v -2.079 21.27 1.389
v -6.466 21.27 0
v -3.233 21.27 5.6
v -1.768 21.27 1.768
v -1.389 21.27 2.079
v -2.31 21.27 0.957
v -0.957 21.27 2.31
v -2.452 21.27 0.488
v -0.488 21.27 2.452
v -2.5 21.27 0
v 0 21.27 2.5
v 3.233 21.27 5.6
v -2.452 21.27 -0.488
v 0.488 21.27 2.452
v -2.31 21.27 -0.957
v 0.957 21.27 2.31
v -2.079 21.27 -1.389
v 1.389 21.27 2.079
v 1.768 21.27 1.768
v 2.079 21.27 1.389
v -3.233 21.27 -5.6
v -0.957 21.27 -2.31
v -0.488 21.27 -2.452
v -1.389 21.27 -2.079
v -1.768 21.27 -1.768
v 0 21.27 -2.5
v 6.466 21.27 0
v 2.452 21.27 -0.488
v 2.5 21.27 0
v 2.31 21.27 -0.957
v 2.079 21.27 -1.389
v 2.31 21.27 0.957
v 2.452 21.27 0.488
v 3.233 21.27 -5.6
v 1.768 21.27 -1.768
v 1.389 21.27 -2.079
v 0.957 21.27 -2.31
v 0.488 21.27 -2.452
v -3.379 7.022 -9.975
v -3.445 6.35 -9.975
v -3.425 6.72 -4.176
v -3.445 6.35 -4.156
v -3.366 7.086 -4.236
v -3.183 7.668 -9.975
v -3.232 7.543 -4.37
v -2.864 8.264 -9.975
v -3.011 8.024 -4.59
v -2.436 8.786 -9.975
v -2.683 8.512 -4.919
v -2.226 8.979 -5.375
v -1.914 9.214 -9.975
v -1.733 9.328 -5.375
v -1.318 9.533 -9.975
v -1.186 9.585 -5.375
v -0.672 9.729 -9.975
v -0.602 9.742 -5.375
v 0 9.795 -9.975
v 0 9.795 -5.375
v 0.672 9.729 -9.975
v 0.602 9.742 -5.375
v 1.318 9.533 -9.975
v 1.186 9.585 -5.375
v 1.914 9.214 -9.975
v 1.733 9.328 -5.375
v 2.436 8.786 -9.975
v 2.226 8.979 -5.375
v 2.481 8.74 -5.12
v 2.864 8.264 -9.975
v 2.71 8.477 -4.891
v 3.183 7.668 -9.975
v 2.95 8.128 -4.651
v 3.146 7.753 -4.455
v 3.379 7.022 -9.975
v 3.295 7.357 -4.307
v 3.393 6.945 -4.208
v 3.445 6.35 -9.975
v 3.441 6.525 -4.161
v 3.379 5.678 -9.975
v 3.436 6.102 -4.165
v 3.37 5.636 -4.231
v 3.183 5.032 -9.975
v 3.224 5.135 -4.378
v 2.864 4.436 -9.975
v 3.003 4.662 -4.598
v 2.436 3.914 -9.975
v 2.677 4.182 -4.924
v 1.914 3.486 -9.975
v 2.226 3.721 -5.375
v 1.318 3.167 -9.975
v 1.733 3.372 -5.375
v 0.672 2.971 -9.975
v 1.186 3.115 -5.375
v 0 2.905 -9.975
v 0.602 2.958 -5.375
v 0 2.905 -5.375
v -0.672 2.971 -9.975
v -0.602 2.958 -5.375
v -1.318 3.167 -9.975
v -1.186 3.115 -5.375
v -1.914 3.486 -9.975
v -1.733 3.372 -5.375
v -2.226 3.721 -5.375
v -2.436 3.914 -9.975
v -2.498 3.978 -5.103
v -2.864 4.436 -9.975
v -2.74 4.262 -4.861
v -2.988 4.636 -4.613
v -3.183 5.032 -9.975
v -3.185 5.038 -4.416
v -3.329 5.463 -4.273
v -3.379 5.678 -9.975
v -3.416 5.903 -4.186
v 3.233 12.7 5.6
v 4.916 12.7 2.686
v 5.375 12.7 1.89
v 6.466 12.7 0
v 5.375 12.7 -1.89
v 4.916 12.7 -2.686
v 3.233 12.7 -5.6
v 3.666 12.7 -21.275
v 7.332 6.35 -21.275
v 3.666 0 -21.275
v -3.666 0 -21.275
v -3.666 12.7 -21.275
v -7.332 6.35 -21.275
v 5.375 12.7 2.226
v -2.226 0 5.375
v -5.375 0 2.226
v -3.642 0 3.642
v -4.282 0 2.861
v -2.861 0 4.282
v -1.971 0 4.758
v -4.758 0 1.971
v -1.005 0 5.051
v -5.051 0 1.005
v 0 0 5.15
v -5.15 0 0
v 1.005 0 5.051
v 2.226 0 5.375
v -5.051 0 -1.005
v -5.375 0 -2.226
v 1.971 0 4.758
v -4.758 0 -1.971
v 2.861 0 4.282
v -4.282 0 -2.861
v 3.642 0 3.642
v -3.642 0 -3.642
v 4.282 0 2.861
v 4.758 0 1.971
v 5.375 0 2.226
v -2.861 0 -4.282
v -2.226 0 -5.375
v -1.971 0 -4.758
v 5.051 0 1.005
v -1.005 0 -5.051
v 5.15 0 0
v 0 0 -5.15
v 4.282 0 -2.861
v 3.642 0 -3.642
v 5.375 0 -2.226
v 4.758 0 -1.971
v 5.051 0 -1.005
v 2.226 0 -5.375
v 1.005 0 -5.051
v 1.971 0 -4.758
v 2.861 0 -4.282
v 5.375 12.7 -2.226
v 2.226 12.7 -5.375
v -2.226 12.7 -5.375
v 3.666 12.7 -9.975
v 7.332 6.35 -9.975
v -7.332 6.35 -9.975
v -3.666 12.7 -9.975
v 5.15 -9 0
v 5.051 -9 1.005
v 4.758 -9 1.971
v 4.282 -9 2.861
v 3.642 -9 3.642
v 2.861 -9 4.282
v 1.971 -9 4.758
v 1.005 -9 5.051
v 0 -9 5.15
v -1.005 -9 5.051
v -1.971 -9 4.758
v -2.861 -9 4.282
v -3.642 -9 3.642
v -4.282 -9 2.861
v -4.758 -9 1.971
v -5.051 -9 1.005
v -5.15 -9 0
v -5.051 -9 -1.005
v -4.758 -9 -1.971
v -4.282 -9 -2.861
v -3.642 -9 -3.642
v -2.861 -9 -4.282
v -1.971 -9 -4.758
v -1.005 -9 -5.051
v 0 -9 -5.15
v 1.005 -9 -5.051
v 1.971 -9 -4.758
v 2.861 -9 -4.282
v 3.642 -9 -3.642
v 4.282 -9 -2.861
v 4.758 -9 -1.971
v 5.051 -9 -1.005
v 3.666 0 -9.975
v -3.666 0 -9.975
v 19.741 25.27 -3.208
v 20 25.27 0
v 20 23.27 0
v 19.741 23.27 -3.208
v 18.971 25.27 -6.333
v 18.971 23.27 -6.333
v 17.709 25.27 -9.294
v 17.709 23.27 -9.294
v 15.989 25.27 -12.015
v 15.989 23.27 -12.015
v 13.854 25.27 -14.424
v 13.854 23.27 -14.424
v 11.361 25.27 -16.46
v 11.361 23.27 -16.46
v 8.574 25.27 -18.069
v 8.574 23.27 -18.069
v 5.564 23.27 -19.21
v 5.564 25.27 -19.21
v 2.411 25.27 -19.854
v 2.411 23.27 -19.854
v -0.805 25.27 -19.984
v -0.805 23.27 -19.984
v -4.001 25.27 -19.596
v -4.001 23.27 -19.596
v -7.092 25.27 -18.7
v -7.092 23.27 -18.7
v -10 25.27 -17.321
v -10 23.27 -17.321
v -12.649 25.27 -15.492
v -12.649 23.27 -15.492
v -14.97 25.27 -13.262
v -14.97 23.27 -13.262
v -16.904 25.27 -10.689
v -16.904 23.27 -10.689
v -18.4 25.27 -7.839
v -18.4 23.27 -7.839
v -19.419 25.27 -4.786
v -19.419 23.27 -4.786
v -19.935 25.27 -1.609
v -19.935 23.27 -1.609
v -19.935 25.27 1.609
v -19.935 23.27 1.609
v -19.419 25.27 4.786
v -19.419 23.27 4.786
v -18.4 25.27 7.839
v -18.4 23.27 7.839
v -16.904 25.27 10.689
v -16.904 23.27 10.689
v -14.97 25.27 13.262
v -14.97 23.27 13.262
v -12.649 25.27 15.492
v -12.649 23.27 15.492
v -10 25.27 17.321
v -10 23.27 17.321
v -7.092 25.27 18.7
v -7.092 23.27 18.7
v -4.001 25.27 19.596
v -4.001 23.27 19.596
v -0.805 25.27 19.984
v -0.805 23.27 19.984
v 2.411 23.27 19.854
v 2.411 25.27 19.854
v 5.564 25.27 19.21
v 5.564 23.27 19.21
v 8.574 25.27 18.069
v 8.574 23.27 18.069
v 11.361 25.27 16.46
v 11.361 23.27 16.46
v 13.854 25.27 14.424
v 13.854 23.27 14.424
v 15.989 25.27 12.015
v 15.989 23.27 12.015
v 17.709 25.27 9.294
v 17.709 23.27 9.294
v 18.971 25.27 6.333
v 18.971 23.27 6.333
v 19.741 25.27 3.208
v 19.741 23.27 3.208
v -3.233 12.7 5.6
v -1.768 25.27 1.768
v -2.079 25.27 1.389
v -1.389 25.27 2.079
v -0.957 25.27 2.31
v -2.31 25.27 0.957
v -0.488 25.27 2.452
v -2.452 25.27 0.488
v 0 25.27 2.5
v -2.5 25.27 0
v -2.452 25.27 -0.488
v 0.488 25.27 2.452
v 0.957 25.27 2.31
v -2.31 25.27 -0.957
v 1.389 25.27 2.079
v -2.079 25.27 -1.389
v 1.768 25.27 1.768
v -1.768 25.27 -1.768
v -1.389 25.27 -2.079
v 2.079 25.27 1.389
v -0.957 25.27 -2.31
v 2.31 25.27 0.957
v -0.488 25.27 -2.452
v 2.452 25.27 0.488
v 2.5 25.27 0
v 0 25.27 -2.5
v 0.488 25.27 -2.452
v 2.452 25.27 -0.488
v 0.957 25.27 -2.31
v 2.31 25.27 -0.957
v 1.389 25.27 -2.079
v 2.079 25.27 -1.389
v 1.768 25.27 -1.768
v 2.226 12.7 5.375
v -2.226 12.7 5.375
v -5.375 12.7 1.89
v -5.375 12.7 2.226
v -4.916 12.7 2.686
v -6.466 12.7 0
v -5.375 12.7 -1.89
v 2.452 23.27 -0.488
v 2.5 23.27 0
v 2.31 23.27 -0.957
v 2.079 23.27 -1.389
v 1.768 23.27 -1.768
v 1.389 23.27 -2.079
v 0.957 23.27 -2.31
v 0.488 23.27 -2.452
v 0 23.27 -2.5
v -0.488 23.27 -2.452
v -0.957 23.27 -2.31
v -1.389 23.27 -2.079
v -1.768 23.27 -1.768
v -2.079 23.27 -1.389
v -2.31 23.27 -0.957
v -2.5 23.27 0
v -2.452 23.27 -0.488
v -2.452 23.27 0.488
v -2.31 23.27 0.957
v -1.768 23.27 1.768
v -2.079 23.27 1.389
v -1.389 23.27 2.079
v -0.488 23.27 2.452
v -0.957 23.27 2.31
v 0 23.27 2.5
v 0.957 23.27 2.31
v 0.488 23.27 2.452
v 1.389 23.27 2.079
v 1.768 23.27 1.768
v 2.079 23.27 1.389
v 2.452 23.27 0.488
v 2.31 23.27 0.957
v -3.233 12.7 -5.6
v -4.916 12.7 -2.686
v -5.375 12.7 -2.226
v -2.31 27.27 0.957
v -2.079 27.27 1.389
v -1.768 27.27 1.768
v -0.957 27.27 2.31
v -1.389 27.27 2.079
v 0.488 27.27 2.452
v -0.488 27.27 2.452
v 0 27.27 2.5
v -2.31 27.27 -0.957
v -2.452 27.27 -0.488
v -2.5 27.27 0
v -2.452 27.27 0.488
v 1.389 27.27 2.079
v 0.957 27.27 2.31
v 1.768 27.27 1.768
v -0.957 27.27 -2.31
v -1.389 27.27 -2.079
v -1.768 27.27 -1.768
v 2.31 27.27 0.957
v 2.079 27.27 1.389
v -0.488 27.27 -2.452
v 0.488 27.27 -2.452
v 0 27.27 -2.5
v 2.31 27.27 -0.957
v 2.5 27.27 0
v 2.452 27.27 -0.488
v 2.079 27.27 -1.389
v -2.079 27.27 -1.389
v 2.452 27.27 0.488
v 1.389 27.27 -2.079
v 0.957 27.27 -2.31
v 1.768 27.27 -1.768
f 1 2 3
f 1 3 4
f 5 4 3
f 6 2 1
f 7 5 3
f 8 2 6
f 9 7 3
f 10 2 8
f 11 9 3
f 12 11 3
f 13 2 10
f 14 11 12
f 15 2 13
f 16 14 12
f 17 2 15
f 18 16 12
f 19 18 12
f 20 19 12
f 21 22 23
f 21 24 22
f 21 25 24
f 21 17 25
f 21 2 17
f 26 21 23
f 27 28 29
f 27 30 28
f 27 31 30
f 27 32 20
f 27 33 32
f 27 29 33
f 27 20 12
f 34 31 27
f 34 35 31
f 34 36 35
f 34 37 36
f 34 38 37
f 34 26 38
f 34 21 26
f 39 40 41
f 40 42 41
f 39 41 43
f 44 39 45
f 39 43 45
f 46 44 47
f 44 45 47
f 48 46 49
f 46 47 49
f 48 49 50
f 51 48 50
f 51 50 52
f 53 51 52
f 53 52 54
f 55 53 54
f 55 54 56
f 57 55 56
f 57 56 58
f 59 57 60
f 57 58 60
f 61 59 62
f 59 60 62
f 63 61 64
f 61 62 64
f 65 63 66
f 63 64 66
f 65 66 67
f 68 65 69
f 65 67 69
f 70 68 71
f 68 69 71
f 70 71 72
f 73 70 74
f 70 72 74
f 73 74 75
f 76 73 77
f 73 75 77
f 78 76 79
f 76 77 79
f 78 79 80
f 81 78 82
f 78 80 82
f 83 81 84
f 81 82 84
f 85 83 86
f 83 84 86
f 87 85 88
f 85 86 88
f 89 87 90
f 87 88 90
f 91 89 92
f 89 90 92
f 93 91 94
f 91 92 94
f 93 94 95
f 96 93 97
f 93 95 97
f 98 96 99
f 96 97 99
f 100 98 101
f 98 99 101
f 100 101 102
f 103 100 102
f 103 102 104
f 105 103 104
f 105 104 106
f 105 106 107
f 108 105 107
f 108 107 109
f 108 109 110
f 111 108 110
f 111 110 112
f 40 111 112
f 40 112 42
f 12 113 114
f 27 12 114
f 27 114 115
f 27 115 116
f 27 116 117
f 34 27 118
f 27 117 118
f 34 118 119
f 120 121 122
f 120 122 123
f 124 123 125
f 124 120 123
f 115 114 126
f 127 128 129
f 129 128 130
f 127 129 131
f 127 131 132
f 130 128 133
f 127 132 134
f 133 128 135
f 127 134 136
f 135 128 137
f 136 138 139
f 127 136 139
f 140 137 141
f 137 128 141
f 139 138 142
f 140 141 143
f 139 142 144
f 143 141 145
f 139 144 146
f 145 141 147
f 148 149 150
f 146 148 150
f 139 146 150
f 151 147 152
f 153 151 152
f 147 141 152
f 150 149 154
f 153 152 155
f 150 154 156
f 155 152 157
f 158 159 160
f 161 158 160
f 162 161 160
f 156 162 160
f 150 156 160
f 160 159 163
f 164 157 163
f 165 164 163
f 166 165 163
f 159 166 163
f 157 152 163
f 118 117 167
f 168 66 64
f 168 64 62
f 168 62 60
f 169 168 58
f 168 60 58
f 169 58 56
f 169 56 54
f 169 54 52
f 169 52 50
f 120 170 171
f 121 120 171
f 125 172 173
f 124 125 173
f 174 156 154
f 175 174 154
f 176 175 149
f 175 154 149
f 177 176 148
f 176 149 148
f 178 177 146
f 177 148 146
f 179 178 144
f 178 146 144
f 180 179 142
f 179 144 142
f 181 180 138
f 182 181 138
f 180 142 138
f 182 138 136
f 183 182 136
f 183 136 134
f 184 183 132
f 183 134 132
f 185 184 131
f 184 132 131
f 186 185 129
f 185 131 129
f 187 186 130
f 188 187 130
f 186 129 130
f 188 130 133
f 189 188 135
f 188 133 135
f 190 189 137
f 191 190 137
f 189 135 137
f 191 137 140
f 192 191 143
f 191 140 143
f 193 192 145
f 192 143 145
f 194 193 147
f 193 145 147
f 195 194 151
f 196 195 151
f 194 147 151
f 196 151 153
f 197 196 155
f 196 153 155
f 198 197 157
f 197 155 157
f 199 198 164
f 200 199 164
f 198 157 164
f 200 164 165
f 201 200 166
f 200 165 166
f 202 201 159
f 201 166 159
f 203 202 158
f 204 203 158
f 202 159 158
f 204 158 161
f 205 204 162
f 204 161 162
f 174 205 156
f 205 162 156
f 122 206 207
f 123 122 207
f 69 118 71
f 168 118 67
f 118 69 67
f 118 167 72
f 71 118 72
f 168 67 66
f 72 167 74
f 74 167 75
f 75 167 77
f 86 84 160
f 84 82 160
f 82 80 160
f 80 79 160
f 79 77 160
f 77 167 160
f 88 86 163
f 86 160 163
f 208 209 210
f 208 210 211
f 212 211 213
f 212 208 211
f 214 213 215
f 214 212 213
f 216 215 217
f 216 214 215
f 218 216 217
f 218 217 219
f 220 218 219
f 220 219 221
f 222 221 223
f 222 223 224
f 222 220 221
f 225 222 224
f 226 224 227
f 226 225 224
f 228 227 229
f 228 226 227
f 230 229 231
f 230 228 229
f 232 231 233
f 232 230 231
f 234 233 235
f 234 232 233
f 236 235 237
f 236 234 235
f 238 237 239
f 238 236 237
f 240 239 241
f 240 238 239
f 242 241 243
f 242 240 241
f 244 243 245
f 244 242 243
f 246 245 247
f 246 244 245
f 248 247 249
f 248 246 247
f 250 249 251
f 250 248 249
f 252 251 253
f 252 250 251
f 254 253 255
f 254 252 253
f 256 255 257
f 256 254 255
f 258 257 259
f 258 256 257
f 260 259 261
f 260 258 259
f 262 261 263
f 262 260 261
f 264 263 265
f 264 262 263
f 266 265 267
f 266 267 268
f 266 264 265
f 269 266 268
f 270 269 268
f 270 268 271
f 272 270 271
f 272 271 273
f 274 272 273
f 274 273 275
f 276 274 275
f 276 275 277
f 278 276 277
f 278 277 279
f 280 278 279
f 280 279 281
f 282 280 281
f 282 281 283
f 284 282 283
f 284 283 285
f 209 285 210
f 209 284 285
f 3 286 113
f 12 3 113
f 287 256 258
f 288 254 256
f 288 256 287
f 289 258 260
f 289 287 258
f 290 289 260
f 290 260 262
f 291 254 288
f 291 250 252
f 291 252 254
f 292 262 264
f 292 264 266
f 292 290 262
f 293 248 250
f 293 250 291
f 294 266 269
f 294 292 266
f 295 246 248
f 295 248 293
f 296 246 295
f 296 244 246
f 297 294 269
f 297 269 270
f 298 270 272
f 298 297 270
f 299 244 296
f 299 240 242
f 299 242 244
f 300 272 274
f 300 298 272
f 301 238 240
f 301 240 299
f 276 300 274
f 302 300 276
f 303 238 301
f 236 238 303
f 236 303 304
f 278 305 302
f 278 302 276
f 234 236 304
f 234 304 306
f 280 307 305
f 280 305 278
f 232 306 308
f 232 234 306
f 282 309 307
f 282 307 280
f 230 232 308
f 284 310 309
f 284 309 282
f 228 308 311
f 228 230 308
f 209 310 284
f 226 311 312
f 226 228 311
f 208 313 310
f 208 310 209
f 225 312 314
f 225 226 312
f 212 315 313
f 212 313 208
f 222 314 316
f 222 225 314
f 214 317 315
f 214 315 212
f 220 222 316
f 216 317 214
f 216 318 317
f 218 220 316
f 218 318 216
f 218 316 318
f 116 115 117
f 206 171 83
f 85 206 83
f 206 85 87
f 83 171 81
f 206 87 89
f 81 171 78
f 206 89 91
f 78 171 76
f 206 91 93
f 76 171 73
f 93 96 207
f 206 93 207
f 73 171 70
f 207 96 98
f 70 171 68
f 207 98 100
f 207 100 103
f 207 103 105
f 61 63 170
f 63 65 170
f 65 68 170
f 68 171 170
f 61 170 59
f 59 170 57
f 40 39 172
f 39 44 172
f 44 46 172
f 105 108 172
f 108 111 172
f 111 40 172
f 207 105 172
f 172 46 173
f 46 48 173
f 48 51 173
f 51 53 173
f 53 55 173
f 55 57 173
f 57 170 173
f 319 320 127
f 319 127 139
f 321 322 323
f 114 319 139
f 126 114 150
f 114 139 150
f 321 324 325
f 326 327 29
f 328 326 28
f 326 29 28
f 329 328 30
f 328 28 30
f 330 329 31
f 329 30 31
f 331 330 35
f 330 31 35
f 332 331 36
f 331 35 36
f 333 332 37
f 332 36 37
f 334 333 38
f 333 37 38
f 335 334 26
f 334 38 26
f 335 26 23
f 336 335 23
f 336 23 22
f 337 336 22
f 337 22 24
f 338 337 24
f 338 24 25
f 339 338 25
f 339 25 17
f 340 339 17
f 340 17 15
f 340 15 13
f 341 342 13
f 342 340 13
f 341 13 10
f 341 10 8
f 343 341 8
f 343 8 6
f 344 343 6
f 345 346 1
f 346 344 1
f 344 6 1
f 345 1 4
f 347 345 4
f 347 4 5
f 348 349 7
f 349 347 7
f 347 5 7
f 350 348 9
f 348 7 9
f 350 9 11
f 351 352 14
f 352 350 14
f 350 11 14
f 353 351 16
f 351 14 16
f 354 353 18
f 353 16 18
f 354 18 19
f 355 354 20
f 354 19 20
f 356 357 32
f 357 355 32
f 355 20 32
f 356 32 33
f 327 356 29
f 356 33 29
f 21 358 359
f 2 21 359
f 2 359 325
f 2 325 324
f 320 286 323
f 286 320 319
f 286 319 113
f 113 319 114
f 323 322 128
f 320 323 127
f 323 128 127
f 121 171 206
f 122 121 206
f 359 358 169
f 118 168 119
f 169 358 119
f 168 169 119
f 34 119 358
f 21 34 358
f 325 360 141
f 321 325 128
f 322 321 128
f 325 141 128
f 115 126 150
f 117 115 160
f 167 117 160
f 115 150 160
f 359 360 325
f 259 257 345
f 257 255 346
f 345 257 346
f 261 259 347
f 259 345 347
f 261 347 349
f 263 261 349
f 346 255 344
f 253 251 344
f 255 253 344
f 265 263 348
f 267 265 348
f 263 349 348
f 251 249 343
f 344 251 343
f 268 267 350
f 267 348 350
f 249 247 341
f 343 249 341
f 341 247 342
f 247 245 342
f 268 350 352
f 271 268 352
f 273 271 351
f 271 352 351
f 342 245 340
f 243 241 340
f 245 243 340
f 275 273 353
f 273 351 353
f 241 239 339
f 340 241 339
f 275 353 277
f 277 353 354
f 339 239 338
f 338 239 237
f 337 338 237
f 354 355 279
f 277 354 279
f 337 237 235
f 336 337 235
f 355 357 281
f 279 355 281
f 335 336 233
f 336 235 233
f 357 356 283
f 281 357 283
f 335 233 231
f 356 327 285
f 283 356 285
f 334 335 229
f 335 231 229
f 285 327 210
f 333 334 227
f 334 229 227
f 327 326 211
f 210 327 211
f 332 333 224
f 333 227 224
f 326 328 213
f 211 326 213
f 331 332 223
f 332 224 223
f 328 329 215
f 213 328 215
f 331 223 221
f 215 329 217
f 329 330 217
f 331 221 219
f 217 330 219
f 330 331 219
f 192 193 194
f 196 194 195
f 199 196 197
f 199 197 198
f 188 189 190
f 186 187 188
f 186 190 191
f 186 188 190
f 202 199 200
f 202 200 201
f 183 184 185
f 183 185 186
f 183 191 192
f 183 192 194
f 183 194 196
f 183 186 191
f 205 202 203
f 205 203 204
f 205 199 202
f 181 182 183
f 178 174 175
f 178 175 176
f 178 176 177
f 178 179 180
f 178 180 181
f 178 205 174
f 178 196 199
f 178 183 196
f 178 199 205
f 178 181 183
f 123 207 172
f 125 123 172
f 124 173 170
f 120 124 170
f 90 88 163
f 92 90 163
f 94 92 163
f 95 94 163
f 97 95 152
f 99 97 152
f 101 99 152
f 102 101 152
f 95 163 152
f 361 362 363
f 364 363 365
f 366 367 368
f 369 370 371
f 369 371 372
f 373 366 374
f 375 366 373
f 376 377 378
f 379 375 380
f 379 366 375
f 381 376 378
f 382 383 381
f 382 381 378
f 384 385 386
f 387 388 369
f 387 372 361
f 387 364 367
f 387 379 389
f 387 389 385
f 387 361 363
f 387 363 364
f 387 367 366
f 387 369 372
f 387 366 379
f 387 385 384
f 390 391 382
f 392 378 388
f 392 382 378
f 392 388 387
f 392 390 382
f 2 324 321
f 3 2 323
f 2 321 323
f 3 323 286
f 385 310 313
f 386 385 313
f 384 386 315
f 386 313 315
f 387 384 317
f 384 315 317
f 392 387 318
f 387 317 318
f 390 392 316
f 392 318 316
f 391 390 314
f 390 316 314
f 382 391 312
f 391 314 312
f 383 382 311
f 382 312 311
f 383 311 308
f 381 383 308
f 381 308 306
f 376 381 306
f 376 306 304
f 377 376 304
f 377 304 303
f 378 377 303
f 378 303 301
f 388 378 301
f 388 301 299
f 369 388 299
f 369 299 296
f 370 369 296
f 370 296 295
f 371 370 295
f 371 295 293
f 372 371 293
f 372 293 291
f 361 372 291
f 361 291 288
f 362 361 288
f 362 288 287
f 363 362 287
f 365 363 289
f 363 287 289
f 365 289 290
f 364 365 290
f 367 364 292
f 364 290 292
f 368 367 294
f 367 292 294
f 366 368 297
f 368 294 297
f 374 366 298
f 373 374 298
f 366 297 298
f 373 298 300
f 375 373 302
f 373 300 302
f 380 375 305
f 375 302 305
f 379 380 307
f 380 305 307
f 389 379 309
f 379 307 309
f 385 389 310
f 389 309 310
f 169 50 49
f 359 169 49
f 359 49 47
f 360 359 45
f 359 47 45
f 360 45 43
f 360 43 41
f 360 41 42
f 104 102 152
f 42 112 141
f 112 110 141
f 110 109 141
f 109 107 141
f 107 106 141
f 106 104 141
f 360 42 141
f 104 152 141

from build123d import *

# Parameters (mm, degrees)
BOSS_EXTRUDE1_DEPTH      = 12.7
SKETCH2_R                = 3.445005279
BOSS_EXTRUDE2_DEPTH      = 4.6
BOSS_EXTRUDE2_DEPTH_BACK = 2
BOSS_EXTRUDE3_DEPTH      = 11.3
SKETCH4_R                = 5.15
BOSS_EXTRUDE4_DEPTH      = 9
BOSS_EXTRUDE5_DEPTH      = 8.57
SKETCH6_R                = 2.5
BOSS_EXTRUDE6_DEPTH      = 6
BOSS_EXTRUDE7_START      = -2
SKETCH7_R                = 20
BOSS_EXTRUDE7_DEPTH      = 2


with BuildPart() as part:
    # Sketch1 → Boss-Extrude1 (new body)
    with BuildSketch(Plane(origin=(0, 0, 0), x_dir=(1, 0, 0), z_dir=(0, 1, 0))):
        Polygon((-2.226397898, -5.375), (2.226397898, -5.375), (5.375, -2.226397898), (5.375, 2.226397898), (2.226397898, 5.375), (-2.226397898, 5.375), (-5.375, 2.226397898), (-5.375, -2.226397898), align=None)
    extrude(amount=BOSS_EXTRUDE1_DEPTH)

    # Sketch2 → Boss-Extrude2 (add, two sides)
    with BuildSketch(Plane(origin=(0, 0, -5.375), x_dir=(-1, 0, 0), z_dir=(0, 0, -1))) as boss_extrude2_sk:
        with Locations((0, 6.35)):
            Circle(SKETCH2_R)
    extrude(amount=BOSS_EXTRUDE2_DEPTH)
    extrude(boss_extrude2_sk.sketch, amount=-BOSS_EXTRUDE2_DEPTH_BACK)

    # Sketch3 → Boss-Extrude3 (add)
    with BuildSketch(Plane(origin=(0, 0, -9.975), x_dir=(-1, 0, 0), z_dir=(0, 0, -1))):
        Polygon((7.332348419, 6.35), (3.666174209, 12.7), (-3.666174209, 12.7), (-7.332348419, 6.35), (-3.666174209, 0), (3.666174209, 0), align=None)
    extrude(amount=BOSS_EXTRUDE3_DEPTH)

    # Sketch4 → Boss-Extrude4 (add)
    with BuildSketch(Plane.XZ):
        Circle(SKETCH4_R)
    extrude(amount=BOSS_EXTRUDE4_DEPTH)

    # Sketch5 → Boss-Extrude5 (add)
    with BuildSketch(Plane(origin=(0, 12.7, 0), x_dir=(1, 0, 0), z_dir=(0, 1, 0))):
        Polygon((6.466323015, 0), (3.233161507, 5.6), (-3.233161507, 5.6), (-6.466323015, 0), (-3.233161507, -5.6), (3.233161507, -5.6), align=None)
    extrude(amount=BOSS_EXTRUDE5_DEPTH)

    # Sketch6 → Boss-Extrude6 (add)
    with BuildSketch(Plane(origin=(0, 21.27, 0), x_dir=(1, 0, 0), z_dir=(0, 1, 0))):
        Circle(SKETCH6_R)
    extrude(amount=BOSS_EXTRUDE6_DEPTH)

    # Sketch7 → Boss-Extrude7 (add)
    with BuildSketch(Plane(origin=(0, 27.27, 0), x_dir=(1, 0, 0), z_dir=(0, 1, 0)).offset(BOSS_EXTRUDE7_START)):
        Circle(SKETCH7_R)
    extrude(amount=-BOSS_EXTRUDE7_DEPTH)


solid = part.part
